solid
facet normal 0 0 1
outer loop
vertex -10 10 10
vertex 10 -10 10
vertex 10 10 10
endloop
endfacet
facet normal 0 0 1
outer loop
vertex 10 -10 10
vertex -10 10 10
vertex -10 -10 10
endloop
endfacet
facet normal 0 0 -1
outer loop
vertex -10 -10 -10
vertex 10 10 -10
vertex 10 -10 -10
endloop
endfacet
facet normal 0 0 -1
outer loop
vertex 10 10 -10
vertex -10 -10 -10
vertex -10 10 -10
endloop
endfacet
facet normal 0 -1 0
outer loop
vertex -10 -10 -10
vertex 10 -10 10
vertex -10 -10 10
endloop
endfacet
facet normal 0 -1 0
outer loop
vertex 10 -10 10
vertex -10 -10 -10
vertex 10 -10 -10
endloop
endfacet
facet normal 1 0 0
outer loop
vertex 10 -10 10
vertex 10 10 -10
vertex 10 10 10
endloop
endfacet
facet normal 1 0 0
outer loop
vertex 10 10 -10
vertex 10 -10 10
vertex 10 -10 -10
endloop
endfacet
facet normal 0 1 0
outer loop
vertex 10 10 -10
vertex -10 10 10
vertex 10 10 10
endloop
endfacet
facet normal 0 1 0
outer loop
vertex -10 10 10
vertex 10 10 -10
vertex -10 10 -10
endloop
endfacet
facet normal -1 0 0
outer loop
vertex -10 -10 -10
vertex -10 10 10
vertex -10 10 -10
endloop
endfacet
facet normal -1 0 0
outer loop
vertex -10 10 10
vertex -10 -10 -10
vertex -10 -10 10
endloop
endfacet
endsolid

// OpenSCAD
// OpenSCAD Library Examples
// This file demonstrates how to use various OpenSCAD libraries

// Uncomment the library you want to test:

// BOSL2 Examples
// use <../libraries/bosl2/attachments.scad>
// use <../libraries/bosl2/shapes.scad>
// use <../libraries/bosl2/distributors.scad>

// Round Anything Examples
// use <../libraries/round-anything/round_anything.scad>

// threads.scad Examples
// use <../libraries/threads-scad/threads.scad>

// dotSCAD Examples
// use <../libraries/dotscad/src/round_corners.scad>
// use <../libraries/dotscad/src/bezier_curve.scad>

// NopSCADlib Examples
// use <../libraries/nopscadlib/core.scad>

// ===========================================
// BOSL2 Examples (uncomment to use)
// ===========================================

// Rounded cube with BOSL2
// rounded_cube([50, 30, 20], r=5, center=true);

// Cylinder with rounded edges
// cyl(h=30, d=20, rounding=3);

// Attachments (for connecting parts)
// attach(TOP) {
//     cube([20, 20, 20], center=true);
// }

// ===========================================
// Round Anything Examples (uncomment to use)
// ===========================================

// Round a cube
// round_cube([40, 40, 40], r=5);

// Round a cylinder
// round_cylinder(h=30, r=10, r2=3);

// Round a polygon
// round_polygon(points=[[0,0], [20,0], [10,20]], r=2);

// ===========================================
// threads.scad Examples (uncomment to use)
// ===========================================

// Metric thread
// metric_thread(diameter=8, pitch=1.25, length=20);

// Internal thread (nut)
// metric_thread(diameter=8, pitch=1.25, length=10, internal=true);

// ===========================================
// dotSCAD Examples (uncomment to use)
// ===========================================

// Bezier curve
// bezier_curve([0, 0, 0], [10, 10, 5], [20, 5, 10], [30, 0, 0], 20);

// Round corners
// round_corners([[0,0], [20,0], [20,20], [0,20]], 3);

// ===========================================
// NopSCADlib Examples (uncomment to use)
// ===========================================

// Screw holes
// screw_hole(M3_cap_screw, 10);

// PCB standoffs
// pcb_spacer(M3_standoff, 10);

// Default example (basic cube)
cube([20, 20, 20], center=true);
